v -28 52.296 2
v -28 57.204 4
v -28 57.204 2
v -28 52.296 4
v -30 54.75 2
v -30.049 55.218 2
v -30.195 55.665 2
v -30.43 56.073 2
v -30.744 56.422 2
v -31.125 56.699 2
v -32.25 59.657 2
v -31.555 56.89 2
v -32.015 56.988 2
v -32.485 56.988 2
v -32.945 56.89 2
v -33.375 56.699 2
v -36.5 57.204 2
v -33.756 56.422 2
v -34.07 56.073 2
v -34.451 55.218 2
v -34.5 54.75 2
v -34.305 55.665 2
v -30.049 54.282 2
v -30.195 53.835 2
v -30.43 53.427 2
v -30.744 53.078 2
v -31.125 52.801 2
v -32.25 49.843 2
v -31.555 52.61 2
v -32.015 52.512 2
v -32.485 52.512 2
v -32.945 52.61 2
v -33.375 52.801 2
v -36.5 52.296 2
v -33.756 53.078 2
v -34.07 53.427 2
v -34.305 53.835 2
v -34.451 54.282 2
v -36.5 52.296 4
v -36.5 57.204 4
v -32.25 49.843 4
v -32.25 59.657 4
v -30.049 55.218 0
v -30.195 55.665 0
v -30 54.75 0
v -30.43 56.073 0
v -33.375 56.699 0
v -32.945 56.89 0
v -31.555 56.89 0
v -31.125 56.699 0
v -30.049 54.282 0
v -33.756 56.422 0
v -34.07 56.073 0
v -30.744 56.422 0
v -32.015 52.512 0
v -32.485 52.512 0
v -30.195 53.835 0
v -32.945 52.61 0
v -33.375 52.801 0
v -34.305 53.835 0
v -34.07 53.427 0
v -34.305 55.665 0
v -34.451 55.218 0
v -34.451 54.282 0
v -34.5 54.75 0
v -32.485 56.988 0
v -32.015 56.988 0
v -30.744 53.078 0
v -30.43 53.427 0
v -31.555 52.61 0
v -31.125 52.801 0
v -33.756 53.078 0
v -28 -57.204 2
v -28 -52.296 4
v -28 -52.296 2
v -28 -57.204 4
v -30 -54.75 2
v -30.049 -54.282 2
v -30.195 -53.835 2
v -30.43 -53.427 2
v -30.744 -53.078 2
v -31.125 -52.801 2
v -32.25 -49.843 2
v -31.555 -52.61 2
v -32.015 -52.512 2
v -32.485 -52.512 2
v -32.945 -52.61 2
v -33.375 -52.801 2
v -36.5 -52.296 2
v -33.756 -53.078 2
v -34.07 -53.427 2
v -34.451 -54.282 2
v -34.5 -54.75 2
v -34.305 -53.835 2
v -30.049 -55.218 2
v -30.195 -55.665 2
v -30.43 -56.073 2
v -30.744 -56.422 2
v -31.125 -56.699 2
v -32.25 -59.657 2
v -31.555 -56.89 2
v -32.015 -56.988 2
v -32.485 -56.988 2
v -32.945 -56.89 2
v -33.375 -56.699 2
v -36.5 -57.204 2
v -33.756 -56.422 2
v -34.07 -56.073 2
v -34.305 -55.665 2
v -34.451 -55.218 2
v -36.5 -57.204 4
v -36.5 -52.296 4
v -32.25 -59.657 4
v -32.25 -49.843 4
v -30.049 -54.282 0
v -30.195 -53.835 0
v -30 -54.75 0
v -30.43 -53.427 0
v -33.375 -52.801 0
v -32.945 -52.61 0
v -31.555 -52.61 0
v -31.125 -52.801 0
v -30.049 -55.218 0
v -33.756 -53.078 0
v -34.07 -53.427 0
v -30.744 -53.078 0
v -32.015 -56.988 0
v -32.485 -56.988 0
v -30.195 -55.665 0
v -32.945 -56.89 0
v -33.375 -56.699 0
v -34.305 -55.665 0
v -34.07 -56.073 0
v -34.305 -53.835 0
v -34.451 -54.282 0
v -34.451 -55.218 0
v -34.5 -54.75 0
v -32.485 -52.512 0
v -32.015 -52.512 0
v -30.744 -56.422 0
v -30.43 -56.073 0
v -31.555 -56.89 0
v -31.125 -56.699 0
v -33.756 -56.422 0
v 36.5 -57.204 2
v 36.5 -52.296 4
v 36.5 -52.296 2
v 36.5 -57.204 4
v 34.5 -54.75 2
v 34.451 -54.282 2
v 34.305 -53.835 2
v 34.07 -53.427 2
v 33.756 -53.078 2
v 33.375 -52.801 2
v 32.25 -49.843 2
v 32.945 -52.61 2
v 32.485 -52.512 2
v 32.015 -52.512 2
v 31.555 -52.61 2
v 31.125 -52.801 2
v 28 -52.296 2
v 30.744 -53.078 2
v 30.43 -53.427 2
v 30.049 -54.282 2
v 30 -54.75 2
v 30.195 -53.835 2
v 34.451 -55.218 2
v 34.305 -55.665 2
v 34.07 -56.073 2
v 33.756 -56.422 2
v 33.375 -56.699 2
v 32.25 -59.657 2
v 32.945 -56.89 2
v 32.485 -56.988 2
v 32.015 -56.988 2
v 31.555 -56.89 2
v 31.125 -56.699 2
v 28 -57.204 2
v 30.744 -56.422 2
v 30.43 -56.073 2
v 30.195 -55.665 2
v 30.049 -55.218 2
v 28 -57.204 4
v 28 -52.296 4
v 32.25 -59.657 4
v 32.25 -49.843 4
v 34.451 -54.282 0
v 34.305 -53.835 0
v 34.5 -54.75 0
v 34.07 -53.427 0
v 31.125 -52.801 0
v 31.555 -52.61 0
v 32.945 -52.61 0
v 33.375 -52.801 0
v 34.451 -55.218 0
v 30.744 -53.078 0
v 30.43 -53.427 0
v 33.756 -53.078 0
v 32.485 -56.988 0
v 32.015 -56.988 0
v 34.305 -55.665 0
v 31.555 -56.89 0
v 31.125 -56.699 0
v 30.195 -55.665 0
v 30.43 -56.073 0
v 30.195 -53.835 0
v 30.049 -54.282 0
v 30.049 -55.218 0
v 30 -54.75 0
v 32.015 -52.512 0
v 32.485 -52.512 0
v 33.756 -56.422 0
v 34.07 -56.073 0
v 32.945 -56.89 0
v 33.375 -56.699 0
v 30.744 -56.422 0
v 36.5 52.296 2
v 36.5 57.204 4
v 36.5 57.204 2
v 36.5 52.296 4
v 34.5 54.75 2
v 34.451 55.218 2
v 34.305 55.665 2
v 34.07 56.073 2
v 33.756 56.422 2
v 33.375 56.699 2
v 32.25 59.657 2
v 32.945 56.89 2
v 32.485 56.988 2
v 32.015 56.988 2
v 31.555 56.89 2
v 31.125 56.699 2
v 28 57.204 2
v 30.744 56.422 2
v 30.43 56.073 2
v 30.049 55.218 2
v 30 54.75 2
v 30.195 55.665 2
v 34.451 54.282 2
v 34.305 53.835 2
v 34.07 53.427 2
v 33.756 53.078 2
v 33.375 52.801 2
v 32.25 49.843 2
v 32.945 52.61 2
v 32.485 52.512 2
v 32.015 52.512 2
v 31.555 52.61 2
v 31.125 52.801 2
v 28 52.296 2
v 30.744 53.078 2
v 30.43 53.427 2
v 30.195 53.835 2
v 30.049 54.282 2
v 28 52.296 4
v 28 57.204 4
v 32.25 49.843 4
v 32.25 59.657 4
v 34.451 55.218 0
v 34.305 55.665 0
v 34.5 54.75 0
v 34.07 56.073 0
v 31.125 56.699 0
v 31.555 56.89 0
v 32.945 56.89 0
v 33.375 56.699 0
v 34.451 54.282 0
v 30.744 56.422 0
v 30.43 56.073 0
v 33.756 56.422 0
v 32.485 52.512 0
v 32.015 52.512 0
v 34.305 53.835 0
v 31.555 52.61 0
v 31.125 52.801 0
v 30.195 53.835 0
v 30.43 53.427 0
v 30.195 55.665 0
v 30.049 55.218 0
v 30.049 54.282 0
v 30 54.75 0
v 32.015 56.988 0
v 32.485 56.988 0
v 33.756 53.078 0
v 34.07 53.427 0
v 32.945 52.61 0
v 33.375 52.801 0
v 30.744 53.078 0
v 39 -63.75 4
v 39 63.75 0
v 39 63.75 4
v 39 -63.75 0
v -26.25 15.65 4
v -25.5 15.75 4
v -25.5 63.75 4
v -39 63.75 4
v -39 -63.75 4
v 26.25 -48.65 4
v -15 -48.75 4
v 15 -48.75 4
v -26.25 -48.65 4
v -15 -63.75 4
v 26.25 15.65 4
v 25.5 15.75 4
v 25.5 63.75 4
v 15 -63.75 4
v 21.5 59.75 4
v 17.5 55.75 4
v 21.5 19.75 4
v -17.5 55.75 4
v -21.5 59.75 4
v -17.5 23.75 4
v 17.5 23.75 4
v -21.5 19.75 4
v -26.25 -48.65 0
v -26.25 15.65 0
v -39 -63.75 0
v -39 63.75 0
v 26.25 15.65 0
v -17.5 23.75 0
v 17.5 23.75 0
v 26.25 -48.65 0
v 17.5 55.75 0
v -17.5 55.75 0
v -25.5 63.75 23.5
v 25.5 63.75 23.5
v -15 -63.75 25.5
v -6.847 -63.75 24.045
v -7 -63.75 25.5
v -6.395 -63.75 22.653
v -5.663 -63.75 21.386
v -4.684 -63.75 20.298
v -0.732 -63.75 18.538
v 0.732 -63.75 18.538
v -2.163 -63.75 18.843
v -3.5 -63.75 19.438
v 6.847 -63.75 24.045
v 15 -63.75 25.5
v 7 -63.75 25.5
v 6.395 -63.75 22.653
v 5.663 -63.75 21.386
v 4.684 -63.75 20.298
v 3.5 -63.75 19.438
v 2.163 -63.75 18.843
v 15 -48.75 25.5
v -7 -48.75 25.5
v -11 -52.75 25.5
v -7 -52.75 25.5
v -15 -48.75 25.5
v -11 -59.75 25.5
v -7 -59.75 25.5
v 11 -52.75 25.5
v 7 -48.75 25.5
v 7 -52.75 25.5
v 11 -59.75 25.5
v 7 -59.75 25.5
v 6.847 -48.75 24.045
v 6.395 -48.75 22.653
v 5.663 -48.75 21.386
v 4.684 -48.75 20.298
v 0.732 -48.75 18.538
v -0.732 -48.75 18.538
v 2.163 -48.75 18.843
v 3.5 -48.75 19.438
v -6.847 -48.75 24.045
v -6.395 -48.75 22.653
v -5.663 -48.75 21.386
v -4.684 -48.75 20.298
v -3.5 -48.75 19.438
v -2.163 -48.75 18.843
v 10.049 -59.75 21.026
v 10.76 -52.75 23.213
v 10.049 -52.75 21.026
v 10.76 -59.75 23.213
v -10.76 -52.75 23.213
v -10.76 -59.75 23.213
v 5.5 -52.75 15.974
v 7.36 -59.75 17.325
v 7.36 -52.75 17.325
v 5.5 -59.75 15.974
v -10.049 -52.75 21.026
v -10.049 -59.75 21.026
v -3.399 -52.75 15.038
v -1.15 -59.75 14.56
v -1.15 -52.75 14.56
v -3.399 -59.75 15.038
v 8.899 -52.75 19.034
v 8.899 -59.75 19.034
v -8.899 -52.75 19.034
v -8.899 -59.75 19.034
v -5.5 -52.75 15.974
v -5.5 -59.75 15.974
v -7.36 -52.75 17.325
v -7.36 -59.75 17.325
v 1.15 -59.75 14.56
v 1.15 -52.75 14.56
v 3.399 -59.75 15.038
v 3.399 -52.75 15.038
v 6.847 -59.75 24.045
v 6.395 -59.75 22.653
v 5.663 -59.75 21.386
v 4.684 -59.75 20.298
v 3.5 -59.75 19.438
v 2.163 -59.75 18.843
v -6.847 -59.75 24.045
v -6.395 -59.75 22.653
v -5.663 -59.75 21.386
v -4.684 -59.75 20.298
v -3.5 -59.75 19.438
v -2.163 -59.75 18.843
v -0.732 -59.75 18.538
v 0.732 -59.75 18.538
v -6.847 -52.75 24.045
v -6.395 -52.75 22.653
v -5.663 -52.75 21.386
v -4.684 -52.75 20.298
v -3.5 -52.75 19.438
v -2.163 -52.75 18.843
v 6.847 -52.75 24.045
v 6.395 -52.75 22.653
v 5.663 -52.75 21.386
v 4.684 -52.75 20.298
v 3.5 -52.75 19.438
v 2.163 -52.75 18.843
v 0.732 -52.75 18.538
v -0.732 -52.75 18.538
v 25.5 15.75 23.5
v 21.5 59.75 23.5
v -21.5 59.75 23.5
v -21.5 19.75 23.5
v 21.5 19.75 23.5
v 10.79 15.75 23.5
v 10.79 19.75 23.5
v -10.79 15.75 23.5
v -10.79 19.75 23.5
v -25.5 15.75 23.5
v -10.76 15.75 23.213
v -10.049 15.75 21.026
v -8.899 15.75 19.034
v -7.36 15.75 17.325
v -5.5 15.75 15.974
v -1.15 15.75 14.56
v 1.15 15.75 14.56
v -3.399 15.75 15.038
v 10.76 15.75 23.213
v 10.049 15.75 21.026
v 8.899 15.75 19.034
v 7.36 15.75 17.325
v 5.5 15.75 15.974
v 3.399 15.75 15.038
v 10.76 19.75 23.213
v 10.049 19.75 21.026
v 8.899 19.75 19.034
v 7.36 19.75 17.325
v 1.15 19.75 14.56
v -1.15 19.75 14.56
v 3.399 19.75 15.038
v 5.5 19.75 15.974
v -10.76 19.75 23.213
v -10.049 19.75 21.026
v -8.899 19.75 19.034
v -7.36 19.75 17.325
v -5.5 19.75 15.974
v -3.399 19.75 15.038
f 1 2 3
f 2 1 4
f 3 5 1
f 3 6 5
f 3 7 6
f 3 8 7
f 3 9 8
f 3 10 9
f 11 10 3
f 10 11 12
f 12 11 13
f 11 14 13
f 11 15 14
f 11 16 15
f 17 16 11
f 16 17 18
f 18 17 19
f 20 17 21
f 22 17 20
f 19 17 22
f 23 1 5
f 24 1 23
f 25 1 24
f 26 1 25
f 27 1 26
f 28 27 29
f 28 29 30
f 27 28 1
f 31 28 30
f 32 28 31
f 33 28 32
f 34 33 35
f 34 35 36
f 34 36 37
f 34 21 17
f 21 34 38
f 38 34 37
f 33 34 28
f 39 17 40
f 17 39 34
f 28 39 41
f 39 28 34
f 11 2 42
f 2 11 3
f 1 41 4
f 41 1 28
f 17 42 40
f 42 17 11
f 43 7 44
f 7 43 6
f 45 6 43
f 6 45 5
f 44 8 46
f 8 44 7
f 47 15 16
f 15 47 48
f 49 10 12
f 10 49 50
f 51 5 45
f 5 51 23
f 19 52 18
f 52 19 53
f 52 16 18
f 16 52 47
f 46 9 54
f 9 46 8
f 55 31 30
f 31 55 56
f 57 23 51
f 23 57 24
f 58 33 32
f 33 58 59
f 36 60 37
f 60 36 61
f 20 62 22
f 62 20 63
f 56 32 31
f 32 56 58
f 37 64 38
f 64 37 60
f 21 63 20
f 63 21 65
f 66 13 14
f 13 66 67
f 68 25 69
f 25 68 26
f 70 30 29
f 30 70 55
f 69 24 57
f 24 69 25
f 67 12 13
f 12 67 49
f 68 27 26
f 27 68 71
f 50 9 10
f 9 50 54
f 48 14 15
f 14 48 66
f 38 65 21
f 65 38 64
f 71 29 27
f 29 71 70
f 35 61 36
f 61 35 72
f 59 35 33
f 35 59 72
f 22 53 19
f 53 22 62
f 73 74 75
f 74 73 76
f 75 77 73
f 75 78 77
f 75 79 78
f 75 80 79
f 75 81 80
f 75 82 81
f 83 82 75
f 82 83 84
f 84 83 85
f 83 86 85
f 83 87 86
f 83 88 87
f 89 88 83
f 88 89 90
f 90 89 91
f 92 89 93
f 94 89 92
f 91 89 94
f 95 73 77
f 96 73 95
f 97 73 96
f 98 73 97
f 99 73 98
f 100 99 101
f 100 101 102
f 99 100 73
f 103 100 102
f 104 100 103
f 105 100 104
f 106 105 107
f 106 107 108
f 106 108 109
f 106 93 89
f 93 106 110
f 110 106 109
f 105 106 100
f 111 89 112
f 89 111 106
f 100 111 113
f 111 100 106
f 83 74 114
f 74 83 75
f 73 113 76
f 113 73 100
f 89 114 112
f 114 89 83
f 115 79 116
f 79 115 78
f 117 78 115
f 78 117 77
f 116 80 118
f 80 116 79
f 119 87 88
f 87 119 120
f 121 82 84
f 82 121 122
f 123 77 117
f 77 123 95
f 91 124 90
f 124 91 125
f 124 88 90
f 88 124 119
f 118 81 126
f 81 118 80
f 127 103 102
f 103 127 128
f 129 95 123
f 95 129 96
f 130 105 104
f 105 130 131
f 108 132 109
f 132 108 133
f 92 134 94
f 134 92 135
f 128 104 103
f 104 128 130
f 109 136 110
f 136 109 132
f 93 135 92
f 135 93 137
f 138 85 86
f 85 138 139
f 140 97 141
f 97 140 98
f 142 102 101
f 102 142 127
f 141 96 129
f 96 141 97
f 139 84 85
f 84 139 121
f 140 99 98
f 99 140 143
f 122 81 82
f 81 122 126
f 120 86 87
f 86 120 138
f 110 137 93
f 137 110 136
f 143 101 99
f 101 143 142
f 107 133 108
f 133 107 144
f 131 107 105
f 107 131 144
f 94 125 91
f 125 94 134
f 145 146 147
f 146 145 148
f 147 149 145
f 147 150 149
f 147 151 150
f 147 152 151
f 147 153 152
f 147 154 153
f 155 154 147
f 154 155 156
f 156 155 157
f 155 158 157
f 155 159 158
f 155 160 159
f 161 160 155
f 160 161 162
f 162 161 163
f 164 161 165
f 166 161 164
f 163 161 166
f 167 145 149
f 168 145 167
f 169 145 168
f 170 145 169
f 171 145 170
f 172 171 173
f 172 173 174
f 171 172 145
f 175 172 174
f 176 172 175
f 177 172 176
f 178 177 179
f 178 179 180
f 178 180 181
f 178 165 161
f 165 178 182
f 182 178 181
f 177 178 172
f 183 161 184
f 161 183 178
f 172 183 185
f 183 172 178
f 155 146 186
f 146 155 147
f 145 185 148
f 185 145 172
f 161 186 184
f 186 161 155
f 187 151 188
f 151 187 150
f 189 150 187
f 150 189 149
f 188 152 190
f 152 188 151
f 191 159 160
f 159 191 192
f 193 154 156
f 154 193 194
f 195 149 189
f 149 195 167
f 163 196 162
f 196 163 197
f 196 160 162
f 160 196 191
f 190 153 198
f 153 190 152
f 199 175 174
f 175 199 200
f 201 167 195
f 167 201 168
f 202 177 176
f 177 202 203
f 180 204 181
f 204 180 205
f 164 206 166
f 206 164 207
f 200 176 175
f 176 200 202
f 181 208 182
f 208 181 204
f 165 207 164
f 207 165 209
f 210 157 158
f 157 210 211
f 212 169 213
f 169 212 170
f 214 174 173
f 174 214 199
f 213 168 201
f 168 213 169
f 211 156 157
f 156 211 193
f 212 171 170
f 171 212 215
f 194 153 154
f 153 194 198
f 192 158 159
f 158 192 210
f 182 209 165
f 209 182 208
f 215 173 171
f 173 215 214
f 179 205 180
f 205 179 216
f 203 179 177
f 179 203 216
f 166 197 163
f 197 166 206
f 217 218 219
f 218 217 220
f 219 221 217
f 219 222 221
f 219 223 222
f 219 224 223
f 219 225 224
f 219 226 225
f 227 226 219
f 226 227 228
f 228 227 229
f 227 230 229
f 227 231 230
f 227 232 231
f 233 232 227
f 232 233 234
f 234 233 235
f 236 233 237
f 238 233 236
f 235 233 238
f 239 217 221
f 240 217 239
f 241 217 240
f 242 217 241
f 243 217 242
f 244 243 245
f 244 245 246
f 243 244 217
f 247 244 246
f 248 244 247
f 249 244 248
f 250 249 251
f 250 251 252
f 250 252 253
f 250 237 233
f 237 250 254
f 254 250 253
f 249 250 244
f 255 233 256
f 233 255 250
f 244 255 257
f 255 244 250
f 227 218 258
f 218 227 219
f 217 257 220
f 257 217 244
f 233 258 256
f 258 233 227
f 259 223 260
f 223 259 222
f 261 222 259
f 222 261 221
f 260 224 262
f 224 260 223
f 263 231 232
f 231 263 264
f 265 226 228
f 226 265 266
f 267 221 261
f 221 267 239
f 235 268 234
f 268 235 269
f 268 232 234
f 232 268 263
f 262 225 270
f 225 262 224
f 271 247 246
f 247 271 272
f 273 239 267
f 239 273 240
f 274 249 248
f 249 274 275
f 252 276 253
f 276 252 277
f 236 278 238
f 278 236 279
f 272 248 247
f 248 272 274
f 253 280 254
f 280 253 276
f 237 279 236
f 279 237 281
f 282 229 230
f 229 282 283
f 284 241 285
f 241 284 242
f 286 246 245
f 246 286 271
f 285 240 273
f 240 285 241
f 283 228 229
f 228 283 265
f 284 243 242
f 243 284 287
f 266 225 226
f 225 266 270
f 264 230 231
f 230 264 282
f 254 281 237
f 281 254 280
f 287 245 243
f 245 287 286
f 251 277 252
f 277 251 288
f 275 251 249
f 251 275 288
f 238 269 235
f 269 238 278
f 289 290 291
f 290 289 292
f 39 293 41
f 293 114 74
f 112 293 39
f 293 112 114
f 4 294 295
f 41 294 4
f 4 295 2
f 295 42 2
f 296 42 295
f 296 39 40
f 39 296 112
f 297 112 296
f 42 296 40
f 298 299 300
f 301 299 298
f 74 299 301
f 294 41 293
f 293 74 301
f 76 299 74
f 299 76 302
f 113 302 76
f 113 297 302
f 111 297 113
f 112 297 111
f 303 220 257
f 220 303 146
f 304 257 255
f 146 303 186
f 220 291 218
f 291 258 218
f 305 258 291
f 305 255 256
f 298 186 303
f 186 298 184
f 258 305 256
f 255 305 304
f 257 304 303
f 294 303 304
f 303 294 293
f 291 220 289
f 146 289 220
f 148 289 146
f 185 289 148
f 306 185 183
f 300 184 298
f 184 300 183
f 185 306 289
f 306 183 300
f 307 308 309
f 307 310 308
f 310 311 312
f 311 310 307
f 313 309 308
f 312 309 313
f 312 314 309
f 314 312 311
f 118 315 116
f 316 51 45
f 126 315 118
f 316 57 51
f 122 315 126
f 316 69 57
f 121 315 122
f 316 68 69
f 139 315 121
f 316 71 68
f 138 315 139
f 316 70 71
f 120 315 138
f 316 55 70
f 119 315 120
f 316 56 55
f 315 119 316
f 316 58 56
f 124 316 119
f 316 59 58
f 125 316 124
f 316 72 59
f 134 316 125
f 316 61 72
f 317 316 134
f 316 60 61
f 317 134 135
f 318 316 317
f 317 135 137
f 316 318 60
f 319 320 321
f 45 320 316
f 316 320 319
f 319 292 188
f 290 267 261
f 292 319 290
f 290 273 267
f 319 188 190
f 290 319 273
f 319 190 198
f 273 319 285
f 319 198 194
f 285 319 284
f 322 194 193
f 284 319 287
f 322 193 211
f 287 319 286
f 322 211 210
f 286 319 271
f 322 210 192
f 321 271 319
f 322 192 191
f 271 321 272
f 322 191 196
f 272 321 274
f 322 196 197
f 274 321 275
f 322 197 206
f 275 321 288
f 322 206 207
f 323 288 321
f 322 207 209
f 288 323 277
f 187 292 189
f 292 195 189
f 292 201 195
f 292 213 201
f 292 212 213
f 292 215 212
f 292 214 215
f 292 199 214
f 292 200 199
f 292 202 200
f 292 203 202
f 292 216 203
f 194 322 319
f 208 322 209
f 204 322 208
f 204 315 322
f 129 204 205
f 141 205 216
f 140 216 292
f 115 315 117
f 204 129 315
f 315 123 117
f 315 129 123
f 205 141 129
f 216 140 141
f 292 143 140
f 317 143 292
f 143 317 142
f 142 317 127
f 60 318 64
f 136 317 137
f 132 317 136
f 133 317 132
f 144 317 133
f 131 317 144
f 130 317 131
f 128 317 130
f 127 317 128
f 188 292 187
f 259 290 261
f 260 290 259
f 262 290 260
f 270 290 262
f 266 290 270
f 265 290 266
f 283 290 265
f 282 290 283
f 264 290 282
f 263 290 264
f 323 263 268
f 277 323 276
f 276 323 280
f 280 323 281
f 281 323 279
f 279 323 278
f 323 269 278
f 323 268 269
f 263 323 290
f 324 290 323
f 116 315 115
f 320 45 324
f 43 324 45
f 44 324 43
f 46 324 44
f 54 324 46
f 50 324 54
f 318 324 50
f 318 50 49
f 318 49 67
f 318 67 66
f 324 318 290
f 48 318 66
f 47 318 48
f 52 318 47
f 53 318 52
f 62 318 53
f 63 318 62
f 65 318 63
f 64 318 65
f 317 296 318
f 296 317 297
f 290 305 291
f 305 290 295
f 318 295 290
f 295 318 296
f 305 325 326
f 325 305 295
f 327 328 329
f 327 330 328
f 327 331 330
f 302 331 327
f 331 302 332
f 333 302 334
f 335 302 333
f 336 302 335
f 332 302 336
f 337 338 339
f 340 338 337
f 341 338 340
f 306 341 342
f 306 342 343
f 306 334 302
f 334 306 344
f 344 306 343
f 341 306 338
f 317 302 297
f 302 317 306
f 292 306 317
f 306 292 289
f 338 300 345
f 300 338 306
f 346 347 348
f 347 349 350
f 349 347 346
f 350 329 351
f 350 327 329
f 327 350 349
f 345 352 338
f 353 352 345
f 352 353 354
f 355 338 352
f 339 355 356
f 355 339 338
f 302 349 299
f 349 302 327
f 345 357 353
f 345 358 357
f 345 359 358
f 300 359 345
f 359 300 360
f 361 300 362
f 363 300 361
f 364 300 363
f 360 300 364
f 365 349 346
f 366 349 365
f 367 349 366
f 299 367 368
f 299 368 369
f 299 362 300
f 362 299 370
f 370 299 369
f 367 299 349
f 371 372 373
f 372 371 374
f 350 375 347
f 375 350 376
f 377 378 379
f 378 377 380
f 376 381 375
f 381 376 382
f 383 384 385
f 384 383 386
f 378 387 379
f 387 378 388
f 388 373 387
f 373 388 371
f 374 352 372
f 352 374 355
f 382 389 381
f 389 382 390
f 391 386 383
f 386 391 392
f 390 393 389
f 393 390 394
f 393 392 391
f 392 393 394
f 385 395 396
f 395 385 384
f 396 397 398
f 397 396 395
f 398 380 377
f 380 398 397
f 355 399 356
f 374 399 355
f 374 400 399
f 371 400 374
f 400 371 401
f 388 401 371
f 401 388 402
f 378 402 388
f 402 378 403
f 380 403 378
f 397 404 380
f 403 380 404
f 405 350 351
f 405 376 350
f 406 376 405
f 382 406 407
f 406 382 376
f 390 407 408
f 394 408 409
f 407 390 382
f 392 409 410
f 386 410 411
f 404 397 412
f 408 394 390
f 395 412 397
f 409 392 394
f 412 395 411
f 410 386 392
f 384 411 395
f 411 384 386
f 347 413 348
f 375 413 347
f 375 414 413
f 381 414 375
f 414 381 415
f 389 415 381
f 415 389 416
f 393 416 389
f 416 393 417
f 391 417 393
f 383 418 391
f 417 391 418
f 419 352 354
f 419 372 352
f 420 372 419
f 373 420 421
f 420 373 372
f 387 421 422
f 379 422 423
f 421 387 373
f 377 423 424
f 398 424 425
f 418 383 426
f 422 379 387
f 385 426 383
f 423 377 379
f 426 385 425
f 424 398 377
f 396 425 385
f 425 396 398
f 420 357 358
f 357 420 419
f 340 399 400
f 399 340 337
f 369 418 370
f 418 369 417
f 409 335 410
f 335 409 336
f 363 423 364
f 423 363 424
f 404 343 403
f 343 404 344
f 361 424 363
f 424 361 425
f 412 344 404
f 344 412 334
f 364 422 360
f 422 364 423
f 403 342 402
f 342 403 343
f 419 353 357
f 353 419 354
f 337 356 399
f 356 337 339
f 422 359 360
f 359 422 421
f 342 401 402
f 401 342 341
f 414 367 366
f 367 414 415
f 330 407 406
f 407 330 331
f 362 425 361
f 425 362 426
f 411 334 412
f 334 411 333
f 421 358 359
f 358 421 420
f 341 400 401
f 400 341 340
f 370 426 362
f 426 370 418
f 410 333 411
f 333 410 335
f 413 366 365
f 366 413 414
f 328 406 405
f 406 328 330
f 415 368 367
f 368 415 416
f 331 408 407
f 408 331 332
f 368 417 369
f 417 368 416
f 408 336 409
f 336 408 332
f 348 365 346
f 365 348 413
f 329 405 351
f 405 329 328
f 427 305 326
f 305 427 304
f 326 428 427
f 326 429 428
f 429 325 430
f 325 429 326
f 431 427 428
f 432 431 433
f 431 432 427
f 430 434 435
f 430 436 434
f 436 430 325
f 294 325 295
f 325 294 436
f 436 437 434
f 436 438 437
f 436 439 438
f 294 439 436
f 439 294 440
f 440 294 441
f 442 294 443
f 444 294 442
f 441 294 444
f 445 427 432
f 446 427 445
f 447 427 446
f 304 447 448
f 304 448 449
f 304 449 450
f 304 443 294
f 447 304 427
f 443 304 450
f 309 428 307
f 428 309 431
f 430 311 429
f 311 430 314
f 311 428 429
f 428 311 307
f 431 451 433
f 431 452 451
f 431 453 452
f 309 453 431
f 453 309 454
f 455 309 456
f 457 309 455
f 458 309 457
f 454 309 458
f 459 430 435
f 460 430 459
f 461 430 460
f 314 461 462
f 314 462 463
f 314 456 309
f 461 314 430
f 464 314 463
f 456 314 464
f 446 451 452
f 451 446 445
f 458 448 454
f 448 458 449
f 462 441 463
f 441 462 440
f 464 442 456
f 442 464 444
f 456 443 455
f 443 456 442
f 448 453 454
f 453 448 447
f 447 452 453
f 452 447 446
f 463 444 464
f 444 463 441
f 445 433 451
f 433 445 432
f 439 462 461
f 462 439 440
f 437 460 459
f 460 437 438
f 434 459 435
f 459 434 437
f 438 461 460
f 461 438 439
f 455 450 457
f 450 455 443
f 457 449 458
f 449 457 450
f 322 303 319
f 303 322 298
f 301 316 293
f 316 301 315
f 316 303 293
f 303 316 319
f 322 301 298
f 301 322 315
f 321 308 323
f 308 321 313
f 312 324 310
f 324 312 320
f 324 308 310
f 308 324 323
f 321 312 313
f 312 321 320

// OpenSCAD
// file: common.scad
/*--------------------------------------------------------------------------*
* Sizes and common routines for the CNC parts
*---------------------------------------------------------------------------*
* 13-Jul-2014 ShaneG
*
* First set of definitions using the components I have to experiment with.
*--------------------------------------------------------------------------*/

//---------------------------------------------------------------------------
// Common definitions
//---------------------------------------------------------------------------

RESOLUTION  = 0.1; // Resolution of your printer

PANEL_DEPTH = 4.0; // The prefered size of any shell material

BOLT_SIZE = 4.5; // Diameter of connecting bolts (M4)

GUIDE_ROD_DIAMETER = 12.50;

BEARING_DIAMETER       = 22.00;
BEARING_INNER_DIAMETER = 14.00;
BEARING_HEIGHT         = 7.00;

MOTOR_DEPTH          = 43;
MOTOR_WIDTH          = 43;
MOTOR_HEIGHT         = 40;
MOTOR_SHAFT_DIAMETER = 5.00;
MOTOR_SHAFT_LENGTH   = 25.00;
MOTOR_SHAFT_BOUNDARY = 22.00;

BED_TO_MOUNT = PANEL_DEPTH + (MOTOR_DEPTH / 2);

//---------------------------------------------------------------------------
// Nuts
//---------------------------------------------------------------------------

/* Hex Nut
**
** Dimensios for a hex nut. The 'outer' diameter (ie: straight side to
** parallel straight side) of the nut does not seem very consistent -
** measurements indicate a 0.5mm range of error across nuts.
*/

NUT_OUTER_DIAMETER = 13.00;
NUT_INNER_DIAMETER = 8.50;  // Enough room for the bore and thread
NUT_HEIGHT         = 6;

NUT4_OUTER_DIAMETER = 8.5;
NUT4_INNER_DIAMETER = 4.5;
NUT4_HEIGHT         = 4.0;

/** Create a hexagon.
 *
 * The 'length' parameter specifies the distance from the center of the
 * hexagon to the center of one of the six straight edges. The 'depth'
 * parameter specifies the size in the Z axis. The resulting object
 * is centered on the origin.
 */
module hexagon(length, depth = 2) {
  width = 2 * length * tan(30);
  union() {
    cube(size = [ length * 2, width, depth ], center = true);
    rotate(a = [ 0, 0, 60 ]) {
      cube(size = [ length * 2, width, depth ], center = true);
      }
    rotate(a = [ 0, 0, -60 ]) {
      cube(size = [ length * 2, width, depth ], center = true);
      }
    }
  }

/** Create a hex nut object
 *
 * This function creates a hex nut (centered on the origin) that contains a
 * hole through the center.
 */
module hexnut(depth = NUT_HEIGHT) {
  difference() {
    hexagon(NUT_OUTER_DIAMETER / 2, depth);
    cylinder(h = 2 * depth, r = NUT_INNER_DIAMETER / 2, center = true, $fs = RESOLUTION);
    }
  }

/** Create a negative hex nut object
 *
 * This function creates a hex nut (centered on the origin) that can be subtracted
 * from another shape to allow a hole for the nut to fit into.
 */
module hexnut_negative(depth = NUT_HEIGHT, spindle = NUT_HEIGHT) {
  union() {
    hexagon(NUT_OUTER_DIAMETER / 2, depth);
    cylinder(h = max(2 * depth, spindle), r = NUT_INNER_DIAMETER / 2, center = true, $fs = RESOLUTION);
    }
  }

/** Create a negative hex nut object
 *
 * This function creates a hex nut (centered on the origin) that can be subtracted
 * from another shape to allow a hole for the nut to fit into.
 */
module hexnut4_negative(depth = NUT4_HEIGHT, spindle = NUT4_HEIGHT) {
  union() {
    hexagon(NUT4_OUTER_DIAMETER / 2, depth);
    cylinder(h = max(2 * depth, spindle), r = NUT4_INNER_DIAMETER / 2, center = true, $fs = RESOLUTION);
    }
  }

//---------------------------------------------------------------------------
// Sizing for the stepper to rod link component. Needed as common because a
// couple of components require it to determine their sizing
//---------------------------------------------------------------------------

LINK_DIAMETER = NUT_OUTER_DIAMETER * 2;
LINK_LENGTH   = MOTOR_SHAFT_LENGTH + (3 * NUT_HEIGHT);
// main file
/*--------------------------------------------------------------------------*
* Mount for the stepper, bearing and link
*---------------------------------------------------------------------------*
* 17-Jul-2014 ShaneG
*
* Defines a mount to hold the stepper motor, a shaft for the threaded rod
* and room for the link component.
*--------------------------------------------------------------------------*/
include <common.scad>;

//--- Common definitions
BEARING_STEM_WIDTH  = BEARING_DIAMETER + (2 * PANEL_DEPTH); // Width (in X) of the stem
BEARING_STEM_HEIGHT = BEARING_HEIGHT + (2 * PANEL_DEPTH);   // Height (in Y) of the stem

MOTOR_STEM_WIDTH  = MOTOR_WIDTH + (2 * PANEL_DEPTH);
MOTOR_STEM_HEIGHT = MOTOR_HEIGHT + (2 * PANEL_DEPTH);
MOTOR_STEM_DEPTH  = (MOTOR_DEPTH + PANEL_DEPTH) / 2;

PLATE_WIDTH  = max(BEARING_STEM_WIDTH, MOTOR_STEM_WIDTH) + (6 * BOLT_SIZE);
PLATE_HEIGHT = BEARING_STEM_HEIGHT + MOTOR_STEM_HEIGHT + (1.5 * LINK_LENGTH);

//---------------------------------------------------------------------------
// Helper modules
//---------------------------------------------------------------------------

/** Create the base
 *
 * The base needs to provide enough space for two connecting bolts and a
 * stem. The resulting object is centered around the Z axis and vertical
 * based at Z = 0.
 */
module baseplate() {
  difference() {
    // Create the base plate
    translate(v = [ 0, 0, PANEL_DEPTH / 2 ]) {
      cube(size = [ PLATE_WIDTH, PLATE_HEIGHT, PANEL_DEPTH ], center = true);
      }
    // Cut holes for the bolts
    translate(v = [ -((PLATE_WIDTH / 2) - (1.5 * BOLT_SIZE)), (PLATE_HEIGHT / 2) - (2 * BOLT_SIZE), PANEL_DEPTH ]) {
      hexnut4_negative(spindle = 3 * PANEL_DEPTH);
      //cylinder(h = PANEL_DEPTH * 4, r = BOLT_SIZE / 2, center = true, $fs = RESOLUTION);
      }
    translate(v = [ -((PLATE_WIDTH / 2) - (1.5 * BOLT_SIZE)), -((PLATE_HEIGHT / 2) - (2 * BOLT_SIZE)), PANEL_DEPTH ]) {
      hexnut4_negative(spindle = 3 * PANEL_DEPTH);
      //cylinder(h = PANEL_DEPTH * 4, r = BOLT_SIZE / 2, center = true, $fs = RESOLUTION);
      }
    translate(v = [ (PLATE_WIDTH / 2) - (1.5 * BOLT_SIZE), -((PLATE_HEIGHT / 2) - (2 * BOLT_SIZE)), PANEL_DEPTH ]) {
      hexnut4_negative(spindle = 3 * PANEL_DEPTH);
      //cylinder(h = PANEL_DEPTH * 4, r = BOLT_SIZE / 2, center = true, $fs = RESOLUTION);
      }
    translate(v = [ (PLATE_WIDTH / 2) - (1.5 * BOLT_SIZE), (PLATE_HEIGHT / 2) - (2 * BOLT_SIZE), PANEL_DEPTH ]) {
      hexnut4_negative(spindle = 3 * PANEL_DEPTH);
      //cylinder(h = PANEL_DEPTH * 4, r = BOLT_SIZE / 2, center = true, $fs = RESOLUTION);
      }
    }
  }

/** Create the stem for the bearing
 *
 * This stem is centered around the Z axis and vertically based at Z = 0. The
 * height of the stem is such that the center of the nut is BED_TO_MOUNT mm
 * from Z = 0.
 */
module stem_bearing() {
  difference() {
    translate(v = [ -BEARING_STEM_WIDTH / 2, -BEARING_STEM_HEIGHT / 2, 0 ]) {
      cube(size = [ BEARING_STEM_WIDTH, BEARING_STEM_HEIGHT, BED_TO_MOUNT ], center = false);
      }
    translate(v = [ 0, 0, BED_TO_MOUNT ]) {
      rotate(a = [ 90, 0, 0 ]) {
        cylinder(h = BEARING_HEIGHT, r = BEARING_DIAMETER / 2, center = true, $fs = RESOLUTION);
        }
      }
    translate(v = [ 0, 0, BED_TO_MOUNT ]) {
      rotate(a = [ 90, 0, 0 ]) {
        cylinder(h = 4 * BEARING_HEIGHT, r = BEARING_INNER_DIAMETER / 2, center = true, $fs = RESOLUTION);
        }
      }
    }
  }

/** Create the stem for the motor
 *
 * This stem is centered around the Z axis and vertically based at Z = 0. The
 * height of the stem is such that the center of the nut is BED_TO_MOUNT mm
 * from Z = 0.
 */
module stem_motor() {
  translate(v = [ -MOTOR_STEM_WIDTH / 2, -MOTOR_STEM_HEIGHT / 2, 0 ]) {
    difference() {
      // Build the basic cube to work at
      cube(size = [ MOTOR_STEM_WIDTH, MOTOR_STEM_HEIGHT, MOTOR_STEM_DEPTH ], center = false);
      // Cut away space for the motor itself
      translate(v = [ PANEL_DEPTH, PANEL_DEPTH, PANEL_DEPTH - RESOLUTION ]) {
        cube(size = [ MOTOR_WIDTH, MOTOR_HEIGHT, MOTOR_DEPTH ], center = false);
        }
      // Cut away a gap at the front for the shaft
      translate(v = [ MOTOR_STEM_WIDTH / 2, 0, BED_TO_MOUNT ]) {
        rotate(a = [ 90, 0, 0 ]) {
          cylinder(h = 4 * BEARING_HEIGHT, r = MOTOR_SHAFT_BOUNDARY / 2, center = true, $fs = RESOLUTION);
          }
        }
      }
    }
  }

//---------------------------------------------------------------------------
// Main shape
//---------------------------------------------------------------------------

difference() {
  union() {
    baseplate();
    translate(v = [ 0, -(PLATE_HEIGHT - BEARING_STEM_HEIGHT) / 2, 0 ]) {
      stem_bearing();
      }
    translate(v = [ 0, (PLATE_HEIGHT - MOTOR_STEM_HEIGHT) / 2, 0 ]) {
      stem_motor();
      }
    }
  // Cut away space in the center to save some plastic
  translate(v = [ -(PLATE_WIDTH - (NUT4_OUTER_DIAMETER * 3)) / 2, (-PLATE_HEIGHT / 2) + BEARING_STEM_HEIGHT + RESOLUTION, -PANEL_DEPTH ]) {
    cube(size = [ PLATE_WIDTH - (NUT4_OUTER_DIAMETER * 3), PLATE_HEIGHT - (MOTOR_STEM_HEIGHT + BEARING_STEM_HEIGHT + (2 * RESOLUTION)), PANEL_DEPTH * 3 ], center = false);
    }
  // Cut away space in the motor mount to save some plastic
  translate(v = [ -(MOTOR_STEM_WIDTH - (4 * PANEL_DEPTH)) / 2, (PLATE_HEIGHT / 2) - MOTOR_STEM_HEIGHT + (2 * PANEL_DEPTH), -(1.5 * PANEL_DEPTH) ]) {
    cube(size= [ MOTOR_STEM_WIDTH - (4 * PANEL_DEPTH), MOTOR_STEM_HEIGHT - (4 * PANEL_DEPTH), 3 * PANEL_DEPTH ], center = false);
    }
  }

// Show some info
echo("Mount length = ", PLATE_HEIGHT);
